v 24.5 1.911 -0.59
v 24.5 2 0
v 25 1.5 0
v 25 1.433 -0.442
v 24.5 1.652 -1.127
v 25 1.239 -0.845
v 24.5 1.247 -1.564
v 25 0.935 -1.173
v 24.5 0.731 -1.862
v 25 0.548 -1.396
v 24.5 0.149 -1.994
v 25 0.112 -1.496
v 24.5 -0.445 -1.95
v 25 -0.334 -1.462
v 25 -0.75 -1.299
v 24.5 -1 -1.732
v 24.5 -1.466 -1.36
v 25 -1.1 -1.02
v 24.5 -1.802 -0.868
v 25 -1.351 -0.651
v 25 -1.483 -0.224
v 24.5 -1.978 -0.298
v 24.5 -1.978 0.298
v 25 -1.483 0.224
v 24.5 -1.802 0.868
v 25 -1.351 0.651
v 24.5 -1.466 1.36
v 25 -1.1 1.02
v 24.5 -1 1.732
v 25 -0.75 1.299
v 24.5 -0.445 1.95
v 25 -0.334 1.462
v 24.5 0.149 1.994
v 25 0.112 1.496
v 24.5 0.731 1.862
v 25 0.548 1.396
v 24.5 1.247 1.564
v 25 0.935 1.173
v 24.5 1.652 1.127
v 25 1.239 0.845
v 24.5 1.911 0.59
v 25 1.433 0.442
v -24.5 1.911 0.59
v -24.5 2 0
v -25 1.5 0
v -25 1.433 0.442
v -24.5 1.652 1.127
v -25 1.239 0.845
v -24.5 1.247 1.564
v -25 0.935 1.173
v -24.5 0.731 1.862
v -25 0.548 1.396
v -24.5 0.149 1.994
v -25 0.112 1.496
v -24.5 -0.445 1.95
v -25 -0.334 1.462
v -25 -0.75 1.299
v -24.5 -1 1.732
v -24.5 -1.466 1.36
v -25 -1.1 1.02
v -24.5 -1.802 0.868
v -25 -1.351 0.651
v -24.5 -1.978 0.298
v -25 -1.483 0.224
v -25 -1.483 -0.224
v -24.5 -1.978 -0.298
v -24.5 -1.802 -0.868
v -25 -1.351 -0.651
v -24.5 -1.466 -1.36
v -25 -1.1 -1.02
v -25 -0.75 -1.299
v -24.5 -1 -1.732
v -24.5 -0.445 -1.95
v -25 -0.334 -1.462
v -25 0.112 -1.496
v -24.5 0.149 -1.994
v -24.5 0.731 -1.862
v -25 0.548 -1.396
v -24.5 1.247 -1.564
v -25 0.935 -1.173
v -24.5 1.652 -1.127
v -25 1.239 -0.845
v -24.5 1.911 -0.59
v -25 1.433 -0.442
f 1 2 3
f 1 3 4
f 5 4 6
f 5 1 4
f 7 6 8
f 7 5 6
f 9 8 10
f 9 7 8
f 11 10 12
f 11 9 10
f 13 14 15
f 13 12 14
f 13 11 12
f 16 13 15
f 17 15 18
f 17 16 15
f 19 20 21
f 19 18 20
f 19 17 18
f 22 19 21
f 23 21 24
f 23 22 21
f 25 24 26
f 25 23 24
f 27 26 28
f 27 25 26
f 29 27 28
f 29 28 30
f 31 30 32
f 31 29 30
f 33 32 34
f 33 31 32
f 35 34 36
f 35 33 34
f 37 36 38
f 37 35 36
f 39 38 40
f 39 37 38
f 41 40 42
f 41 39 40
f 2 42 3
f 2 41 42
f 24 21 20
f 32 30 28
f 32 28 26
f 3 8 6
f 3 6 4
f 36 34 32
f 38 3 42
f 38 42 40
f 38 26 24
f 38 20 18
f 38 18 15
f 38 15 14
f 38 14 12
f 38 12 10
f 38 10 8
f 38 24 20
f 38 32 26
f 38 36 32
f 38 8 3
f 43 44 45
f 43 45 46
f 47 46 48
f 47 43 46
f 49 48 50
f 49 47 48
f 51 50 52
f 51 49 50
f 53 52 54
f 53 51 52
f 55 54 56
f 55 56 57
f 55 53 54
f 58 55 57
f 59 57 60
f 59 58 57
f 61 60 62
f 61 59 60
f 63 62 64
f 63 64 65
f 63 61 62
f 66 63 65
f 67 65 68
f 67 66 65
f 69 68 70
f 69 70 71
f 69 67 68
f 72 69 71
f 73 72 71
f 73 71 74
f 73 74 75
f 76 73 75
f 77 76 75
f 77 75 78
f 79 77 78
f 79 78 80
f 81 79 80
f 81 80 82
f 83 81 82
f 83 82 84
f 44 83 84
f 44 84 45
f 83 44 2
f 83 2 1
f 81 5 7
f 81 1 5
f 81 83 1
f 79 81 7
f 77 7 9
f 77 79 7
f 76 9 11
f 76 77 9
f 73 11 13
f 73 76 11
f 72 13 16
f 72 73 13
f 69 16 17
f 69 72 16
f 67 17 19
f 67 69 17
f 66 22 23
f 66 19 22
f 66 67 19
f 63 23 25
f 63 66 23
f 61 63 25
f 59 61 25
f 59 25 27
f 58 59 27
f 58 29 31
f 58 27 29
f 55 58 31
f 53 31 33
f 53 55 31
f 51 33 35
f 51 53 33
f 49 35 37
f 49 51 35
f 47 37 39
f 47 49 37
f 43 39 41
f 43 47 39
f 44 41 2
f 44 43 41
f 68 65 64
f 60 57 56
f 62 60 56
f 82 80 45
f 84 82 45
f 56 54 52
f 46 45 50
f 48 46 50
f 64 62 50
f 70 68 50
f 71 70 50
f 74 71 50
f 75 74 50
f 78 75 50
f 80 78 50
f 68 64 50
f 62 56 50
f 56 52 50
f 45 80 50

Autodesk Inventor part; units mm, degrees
ref_plane "YZ Plane" through (0, 0, 0) normal (1, 0, 0) x (0, 1, 0)
ref_plane "XZ Plane" through (0, 0, 0) normal (0, 1, 0) x (-1, 0, 0)
ref_plane "XY Plane" through (0, 0, 0) normal (0, 0, 1) x (1, 0, 0)
sketch "Szkic1" plane through (0, 0, 0) normal (0, 0, 1) x (1, 0, 0)
  point P0 (0, 0)
sketch "Szkic2" plane through (0, 0, 0) normal (0, 0, 1) x (1, 0, 0)
  line L0 (-25, 0) -> (25, 0)
  line L1 (25, 0) -> (25, 2)
  line L2 (25, 2) -> (-25, 2)
  line L3 (-25, 2) -> (-25, 0)
  point P0 (0, 0)
  point P1 (0, 1)
  dimension "d0" = 50
  dimension "d1" = 2
revolve "Obrót1" add sketch "Szkic2" angle 360 about axis through (-25, 0, 0) along (1, 0, 0)
chamfer "Faza1" distance 0.5 angle 45 1 edges at (25, -2, 0) measured on face at (25, 0.0679, 1.2634)
chamfer "Faza2" distance 0.5 angle 45 1 edges at (-25, -2, 0) measured on face at (-25, 0.6473, -0.1595)
